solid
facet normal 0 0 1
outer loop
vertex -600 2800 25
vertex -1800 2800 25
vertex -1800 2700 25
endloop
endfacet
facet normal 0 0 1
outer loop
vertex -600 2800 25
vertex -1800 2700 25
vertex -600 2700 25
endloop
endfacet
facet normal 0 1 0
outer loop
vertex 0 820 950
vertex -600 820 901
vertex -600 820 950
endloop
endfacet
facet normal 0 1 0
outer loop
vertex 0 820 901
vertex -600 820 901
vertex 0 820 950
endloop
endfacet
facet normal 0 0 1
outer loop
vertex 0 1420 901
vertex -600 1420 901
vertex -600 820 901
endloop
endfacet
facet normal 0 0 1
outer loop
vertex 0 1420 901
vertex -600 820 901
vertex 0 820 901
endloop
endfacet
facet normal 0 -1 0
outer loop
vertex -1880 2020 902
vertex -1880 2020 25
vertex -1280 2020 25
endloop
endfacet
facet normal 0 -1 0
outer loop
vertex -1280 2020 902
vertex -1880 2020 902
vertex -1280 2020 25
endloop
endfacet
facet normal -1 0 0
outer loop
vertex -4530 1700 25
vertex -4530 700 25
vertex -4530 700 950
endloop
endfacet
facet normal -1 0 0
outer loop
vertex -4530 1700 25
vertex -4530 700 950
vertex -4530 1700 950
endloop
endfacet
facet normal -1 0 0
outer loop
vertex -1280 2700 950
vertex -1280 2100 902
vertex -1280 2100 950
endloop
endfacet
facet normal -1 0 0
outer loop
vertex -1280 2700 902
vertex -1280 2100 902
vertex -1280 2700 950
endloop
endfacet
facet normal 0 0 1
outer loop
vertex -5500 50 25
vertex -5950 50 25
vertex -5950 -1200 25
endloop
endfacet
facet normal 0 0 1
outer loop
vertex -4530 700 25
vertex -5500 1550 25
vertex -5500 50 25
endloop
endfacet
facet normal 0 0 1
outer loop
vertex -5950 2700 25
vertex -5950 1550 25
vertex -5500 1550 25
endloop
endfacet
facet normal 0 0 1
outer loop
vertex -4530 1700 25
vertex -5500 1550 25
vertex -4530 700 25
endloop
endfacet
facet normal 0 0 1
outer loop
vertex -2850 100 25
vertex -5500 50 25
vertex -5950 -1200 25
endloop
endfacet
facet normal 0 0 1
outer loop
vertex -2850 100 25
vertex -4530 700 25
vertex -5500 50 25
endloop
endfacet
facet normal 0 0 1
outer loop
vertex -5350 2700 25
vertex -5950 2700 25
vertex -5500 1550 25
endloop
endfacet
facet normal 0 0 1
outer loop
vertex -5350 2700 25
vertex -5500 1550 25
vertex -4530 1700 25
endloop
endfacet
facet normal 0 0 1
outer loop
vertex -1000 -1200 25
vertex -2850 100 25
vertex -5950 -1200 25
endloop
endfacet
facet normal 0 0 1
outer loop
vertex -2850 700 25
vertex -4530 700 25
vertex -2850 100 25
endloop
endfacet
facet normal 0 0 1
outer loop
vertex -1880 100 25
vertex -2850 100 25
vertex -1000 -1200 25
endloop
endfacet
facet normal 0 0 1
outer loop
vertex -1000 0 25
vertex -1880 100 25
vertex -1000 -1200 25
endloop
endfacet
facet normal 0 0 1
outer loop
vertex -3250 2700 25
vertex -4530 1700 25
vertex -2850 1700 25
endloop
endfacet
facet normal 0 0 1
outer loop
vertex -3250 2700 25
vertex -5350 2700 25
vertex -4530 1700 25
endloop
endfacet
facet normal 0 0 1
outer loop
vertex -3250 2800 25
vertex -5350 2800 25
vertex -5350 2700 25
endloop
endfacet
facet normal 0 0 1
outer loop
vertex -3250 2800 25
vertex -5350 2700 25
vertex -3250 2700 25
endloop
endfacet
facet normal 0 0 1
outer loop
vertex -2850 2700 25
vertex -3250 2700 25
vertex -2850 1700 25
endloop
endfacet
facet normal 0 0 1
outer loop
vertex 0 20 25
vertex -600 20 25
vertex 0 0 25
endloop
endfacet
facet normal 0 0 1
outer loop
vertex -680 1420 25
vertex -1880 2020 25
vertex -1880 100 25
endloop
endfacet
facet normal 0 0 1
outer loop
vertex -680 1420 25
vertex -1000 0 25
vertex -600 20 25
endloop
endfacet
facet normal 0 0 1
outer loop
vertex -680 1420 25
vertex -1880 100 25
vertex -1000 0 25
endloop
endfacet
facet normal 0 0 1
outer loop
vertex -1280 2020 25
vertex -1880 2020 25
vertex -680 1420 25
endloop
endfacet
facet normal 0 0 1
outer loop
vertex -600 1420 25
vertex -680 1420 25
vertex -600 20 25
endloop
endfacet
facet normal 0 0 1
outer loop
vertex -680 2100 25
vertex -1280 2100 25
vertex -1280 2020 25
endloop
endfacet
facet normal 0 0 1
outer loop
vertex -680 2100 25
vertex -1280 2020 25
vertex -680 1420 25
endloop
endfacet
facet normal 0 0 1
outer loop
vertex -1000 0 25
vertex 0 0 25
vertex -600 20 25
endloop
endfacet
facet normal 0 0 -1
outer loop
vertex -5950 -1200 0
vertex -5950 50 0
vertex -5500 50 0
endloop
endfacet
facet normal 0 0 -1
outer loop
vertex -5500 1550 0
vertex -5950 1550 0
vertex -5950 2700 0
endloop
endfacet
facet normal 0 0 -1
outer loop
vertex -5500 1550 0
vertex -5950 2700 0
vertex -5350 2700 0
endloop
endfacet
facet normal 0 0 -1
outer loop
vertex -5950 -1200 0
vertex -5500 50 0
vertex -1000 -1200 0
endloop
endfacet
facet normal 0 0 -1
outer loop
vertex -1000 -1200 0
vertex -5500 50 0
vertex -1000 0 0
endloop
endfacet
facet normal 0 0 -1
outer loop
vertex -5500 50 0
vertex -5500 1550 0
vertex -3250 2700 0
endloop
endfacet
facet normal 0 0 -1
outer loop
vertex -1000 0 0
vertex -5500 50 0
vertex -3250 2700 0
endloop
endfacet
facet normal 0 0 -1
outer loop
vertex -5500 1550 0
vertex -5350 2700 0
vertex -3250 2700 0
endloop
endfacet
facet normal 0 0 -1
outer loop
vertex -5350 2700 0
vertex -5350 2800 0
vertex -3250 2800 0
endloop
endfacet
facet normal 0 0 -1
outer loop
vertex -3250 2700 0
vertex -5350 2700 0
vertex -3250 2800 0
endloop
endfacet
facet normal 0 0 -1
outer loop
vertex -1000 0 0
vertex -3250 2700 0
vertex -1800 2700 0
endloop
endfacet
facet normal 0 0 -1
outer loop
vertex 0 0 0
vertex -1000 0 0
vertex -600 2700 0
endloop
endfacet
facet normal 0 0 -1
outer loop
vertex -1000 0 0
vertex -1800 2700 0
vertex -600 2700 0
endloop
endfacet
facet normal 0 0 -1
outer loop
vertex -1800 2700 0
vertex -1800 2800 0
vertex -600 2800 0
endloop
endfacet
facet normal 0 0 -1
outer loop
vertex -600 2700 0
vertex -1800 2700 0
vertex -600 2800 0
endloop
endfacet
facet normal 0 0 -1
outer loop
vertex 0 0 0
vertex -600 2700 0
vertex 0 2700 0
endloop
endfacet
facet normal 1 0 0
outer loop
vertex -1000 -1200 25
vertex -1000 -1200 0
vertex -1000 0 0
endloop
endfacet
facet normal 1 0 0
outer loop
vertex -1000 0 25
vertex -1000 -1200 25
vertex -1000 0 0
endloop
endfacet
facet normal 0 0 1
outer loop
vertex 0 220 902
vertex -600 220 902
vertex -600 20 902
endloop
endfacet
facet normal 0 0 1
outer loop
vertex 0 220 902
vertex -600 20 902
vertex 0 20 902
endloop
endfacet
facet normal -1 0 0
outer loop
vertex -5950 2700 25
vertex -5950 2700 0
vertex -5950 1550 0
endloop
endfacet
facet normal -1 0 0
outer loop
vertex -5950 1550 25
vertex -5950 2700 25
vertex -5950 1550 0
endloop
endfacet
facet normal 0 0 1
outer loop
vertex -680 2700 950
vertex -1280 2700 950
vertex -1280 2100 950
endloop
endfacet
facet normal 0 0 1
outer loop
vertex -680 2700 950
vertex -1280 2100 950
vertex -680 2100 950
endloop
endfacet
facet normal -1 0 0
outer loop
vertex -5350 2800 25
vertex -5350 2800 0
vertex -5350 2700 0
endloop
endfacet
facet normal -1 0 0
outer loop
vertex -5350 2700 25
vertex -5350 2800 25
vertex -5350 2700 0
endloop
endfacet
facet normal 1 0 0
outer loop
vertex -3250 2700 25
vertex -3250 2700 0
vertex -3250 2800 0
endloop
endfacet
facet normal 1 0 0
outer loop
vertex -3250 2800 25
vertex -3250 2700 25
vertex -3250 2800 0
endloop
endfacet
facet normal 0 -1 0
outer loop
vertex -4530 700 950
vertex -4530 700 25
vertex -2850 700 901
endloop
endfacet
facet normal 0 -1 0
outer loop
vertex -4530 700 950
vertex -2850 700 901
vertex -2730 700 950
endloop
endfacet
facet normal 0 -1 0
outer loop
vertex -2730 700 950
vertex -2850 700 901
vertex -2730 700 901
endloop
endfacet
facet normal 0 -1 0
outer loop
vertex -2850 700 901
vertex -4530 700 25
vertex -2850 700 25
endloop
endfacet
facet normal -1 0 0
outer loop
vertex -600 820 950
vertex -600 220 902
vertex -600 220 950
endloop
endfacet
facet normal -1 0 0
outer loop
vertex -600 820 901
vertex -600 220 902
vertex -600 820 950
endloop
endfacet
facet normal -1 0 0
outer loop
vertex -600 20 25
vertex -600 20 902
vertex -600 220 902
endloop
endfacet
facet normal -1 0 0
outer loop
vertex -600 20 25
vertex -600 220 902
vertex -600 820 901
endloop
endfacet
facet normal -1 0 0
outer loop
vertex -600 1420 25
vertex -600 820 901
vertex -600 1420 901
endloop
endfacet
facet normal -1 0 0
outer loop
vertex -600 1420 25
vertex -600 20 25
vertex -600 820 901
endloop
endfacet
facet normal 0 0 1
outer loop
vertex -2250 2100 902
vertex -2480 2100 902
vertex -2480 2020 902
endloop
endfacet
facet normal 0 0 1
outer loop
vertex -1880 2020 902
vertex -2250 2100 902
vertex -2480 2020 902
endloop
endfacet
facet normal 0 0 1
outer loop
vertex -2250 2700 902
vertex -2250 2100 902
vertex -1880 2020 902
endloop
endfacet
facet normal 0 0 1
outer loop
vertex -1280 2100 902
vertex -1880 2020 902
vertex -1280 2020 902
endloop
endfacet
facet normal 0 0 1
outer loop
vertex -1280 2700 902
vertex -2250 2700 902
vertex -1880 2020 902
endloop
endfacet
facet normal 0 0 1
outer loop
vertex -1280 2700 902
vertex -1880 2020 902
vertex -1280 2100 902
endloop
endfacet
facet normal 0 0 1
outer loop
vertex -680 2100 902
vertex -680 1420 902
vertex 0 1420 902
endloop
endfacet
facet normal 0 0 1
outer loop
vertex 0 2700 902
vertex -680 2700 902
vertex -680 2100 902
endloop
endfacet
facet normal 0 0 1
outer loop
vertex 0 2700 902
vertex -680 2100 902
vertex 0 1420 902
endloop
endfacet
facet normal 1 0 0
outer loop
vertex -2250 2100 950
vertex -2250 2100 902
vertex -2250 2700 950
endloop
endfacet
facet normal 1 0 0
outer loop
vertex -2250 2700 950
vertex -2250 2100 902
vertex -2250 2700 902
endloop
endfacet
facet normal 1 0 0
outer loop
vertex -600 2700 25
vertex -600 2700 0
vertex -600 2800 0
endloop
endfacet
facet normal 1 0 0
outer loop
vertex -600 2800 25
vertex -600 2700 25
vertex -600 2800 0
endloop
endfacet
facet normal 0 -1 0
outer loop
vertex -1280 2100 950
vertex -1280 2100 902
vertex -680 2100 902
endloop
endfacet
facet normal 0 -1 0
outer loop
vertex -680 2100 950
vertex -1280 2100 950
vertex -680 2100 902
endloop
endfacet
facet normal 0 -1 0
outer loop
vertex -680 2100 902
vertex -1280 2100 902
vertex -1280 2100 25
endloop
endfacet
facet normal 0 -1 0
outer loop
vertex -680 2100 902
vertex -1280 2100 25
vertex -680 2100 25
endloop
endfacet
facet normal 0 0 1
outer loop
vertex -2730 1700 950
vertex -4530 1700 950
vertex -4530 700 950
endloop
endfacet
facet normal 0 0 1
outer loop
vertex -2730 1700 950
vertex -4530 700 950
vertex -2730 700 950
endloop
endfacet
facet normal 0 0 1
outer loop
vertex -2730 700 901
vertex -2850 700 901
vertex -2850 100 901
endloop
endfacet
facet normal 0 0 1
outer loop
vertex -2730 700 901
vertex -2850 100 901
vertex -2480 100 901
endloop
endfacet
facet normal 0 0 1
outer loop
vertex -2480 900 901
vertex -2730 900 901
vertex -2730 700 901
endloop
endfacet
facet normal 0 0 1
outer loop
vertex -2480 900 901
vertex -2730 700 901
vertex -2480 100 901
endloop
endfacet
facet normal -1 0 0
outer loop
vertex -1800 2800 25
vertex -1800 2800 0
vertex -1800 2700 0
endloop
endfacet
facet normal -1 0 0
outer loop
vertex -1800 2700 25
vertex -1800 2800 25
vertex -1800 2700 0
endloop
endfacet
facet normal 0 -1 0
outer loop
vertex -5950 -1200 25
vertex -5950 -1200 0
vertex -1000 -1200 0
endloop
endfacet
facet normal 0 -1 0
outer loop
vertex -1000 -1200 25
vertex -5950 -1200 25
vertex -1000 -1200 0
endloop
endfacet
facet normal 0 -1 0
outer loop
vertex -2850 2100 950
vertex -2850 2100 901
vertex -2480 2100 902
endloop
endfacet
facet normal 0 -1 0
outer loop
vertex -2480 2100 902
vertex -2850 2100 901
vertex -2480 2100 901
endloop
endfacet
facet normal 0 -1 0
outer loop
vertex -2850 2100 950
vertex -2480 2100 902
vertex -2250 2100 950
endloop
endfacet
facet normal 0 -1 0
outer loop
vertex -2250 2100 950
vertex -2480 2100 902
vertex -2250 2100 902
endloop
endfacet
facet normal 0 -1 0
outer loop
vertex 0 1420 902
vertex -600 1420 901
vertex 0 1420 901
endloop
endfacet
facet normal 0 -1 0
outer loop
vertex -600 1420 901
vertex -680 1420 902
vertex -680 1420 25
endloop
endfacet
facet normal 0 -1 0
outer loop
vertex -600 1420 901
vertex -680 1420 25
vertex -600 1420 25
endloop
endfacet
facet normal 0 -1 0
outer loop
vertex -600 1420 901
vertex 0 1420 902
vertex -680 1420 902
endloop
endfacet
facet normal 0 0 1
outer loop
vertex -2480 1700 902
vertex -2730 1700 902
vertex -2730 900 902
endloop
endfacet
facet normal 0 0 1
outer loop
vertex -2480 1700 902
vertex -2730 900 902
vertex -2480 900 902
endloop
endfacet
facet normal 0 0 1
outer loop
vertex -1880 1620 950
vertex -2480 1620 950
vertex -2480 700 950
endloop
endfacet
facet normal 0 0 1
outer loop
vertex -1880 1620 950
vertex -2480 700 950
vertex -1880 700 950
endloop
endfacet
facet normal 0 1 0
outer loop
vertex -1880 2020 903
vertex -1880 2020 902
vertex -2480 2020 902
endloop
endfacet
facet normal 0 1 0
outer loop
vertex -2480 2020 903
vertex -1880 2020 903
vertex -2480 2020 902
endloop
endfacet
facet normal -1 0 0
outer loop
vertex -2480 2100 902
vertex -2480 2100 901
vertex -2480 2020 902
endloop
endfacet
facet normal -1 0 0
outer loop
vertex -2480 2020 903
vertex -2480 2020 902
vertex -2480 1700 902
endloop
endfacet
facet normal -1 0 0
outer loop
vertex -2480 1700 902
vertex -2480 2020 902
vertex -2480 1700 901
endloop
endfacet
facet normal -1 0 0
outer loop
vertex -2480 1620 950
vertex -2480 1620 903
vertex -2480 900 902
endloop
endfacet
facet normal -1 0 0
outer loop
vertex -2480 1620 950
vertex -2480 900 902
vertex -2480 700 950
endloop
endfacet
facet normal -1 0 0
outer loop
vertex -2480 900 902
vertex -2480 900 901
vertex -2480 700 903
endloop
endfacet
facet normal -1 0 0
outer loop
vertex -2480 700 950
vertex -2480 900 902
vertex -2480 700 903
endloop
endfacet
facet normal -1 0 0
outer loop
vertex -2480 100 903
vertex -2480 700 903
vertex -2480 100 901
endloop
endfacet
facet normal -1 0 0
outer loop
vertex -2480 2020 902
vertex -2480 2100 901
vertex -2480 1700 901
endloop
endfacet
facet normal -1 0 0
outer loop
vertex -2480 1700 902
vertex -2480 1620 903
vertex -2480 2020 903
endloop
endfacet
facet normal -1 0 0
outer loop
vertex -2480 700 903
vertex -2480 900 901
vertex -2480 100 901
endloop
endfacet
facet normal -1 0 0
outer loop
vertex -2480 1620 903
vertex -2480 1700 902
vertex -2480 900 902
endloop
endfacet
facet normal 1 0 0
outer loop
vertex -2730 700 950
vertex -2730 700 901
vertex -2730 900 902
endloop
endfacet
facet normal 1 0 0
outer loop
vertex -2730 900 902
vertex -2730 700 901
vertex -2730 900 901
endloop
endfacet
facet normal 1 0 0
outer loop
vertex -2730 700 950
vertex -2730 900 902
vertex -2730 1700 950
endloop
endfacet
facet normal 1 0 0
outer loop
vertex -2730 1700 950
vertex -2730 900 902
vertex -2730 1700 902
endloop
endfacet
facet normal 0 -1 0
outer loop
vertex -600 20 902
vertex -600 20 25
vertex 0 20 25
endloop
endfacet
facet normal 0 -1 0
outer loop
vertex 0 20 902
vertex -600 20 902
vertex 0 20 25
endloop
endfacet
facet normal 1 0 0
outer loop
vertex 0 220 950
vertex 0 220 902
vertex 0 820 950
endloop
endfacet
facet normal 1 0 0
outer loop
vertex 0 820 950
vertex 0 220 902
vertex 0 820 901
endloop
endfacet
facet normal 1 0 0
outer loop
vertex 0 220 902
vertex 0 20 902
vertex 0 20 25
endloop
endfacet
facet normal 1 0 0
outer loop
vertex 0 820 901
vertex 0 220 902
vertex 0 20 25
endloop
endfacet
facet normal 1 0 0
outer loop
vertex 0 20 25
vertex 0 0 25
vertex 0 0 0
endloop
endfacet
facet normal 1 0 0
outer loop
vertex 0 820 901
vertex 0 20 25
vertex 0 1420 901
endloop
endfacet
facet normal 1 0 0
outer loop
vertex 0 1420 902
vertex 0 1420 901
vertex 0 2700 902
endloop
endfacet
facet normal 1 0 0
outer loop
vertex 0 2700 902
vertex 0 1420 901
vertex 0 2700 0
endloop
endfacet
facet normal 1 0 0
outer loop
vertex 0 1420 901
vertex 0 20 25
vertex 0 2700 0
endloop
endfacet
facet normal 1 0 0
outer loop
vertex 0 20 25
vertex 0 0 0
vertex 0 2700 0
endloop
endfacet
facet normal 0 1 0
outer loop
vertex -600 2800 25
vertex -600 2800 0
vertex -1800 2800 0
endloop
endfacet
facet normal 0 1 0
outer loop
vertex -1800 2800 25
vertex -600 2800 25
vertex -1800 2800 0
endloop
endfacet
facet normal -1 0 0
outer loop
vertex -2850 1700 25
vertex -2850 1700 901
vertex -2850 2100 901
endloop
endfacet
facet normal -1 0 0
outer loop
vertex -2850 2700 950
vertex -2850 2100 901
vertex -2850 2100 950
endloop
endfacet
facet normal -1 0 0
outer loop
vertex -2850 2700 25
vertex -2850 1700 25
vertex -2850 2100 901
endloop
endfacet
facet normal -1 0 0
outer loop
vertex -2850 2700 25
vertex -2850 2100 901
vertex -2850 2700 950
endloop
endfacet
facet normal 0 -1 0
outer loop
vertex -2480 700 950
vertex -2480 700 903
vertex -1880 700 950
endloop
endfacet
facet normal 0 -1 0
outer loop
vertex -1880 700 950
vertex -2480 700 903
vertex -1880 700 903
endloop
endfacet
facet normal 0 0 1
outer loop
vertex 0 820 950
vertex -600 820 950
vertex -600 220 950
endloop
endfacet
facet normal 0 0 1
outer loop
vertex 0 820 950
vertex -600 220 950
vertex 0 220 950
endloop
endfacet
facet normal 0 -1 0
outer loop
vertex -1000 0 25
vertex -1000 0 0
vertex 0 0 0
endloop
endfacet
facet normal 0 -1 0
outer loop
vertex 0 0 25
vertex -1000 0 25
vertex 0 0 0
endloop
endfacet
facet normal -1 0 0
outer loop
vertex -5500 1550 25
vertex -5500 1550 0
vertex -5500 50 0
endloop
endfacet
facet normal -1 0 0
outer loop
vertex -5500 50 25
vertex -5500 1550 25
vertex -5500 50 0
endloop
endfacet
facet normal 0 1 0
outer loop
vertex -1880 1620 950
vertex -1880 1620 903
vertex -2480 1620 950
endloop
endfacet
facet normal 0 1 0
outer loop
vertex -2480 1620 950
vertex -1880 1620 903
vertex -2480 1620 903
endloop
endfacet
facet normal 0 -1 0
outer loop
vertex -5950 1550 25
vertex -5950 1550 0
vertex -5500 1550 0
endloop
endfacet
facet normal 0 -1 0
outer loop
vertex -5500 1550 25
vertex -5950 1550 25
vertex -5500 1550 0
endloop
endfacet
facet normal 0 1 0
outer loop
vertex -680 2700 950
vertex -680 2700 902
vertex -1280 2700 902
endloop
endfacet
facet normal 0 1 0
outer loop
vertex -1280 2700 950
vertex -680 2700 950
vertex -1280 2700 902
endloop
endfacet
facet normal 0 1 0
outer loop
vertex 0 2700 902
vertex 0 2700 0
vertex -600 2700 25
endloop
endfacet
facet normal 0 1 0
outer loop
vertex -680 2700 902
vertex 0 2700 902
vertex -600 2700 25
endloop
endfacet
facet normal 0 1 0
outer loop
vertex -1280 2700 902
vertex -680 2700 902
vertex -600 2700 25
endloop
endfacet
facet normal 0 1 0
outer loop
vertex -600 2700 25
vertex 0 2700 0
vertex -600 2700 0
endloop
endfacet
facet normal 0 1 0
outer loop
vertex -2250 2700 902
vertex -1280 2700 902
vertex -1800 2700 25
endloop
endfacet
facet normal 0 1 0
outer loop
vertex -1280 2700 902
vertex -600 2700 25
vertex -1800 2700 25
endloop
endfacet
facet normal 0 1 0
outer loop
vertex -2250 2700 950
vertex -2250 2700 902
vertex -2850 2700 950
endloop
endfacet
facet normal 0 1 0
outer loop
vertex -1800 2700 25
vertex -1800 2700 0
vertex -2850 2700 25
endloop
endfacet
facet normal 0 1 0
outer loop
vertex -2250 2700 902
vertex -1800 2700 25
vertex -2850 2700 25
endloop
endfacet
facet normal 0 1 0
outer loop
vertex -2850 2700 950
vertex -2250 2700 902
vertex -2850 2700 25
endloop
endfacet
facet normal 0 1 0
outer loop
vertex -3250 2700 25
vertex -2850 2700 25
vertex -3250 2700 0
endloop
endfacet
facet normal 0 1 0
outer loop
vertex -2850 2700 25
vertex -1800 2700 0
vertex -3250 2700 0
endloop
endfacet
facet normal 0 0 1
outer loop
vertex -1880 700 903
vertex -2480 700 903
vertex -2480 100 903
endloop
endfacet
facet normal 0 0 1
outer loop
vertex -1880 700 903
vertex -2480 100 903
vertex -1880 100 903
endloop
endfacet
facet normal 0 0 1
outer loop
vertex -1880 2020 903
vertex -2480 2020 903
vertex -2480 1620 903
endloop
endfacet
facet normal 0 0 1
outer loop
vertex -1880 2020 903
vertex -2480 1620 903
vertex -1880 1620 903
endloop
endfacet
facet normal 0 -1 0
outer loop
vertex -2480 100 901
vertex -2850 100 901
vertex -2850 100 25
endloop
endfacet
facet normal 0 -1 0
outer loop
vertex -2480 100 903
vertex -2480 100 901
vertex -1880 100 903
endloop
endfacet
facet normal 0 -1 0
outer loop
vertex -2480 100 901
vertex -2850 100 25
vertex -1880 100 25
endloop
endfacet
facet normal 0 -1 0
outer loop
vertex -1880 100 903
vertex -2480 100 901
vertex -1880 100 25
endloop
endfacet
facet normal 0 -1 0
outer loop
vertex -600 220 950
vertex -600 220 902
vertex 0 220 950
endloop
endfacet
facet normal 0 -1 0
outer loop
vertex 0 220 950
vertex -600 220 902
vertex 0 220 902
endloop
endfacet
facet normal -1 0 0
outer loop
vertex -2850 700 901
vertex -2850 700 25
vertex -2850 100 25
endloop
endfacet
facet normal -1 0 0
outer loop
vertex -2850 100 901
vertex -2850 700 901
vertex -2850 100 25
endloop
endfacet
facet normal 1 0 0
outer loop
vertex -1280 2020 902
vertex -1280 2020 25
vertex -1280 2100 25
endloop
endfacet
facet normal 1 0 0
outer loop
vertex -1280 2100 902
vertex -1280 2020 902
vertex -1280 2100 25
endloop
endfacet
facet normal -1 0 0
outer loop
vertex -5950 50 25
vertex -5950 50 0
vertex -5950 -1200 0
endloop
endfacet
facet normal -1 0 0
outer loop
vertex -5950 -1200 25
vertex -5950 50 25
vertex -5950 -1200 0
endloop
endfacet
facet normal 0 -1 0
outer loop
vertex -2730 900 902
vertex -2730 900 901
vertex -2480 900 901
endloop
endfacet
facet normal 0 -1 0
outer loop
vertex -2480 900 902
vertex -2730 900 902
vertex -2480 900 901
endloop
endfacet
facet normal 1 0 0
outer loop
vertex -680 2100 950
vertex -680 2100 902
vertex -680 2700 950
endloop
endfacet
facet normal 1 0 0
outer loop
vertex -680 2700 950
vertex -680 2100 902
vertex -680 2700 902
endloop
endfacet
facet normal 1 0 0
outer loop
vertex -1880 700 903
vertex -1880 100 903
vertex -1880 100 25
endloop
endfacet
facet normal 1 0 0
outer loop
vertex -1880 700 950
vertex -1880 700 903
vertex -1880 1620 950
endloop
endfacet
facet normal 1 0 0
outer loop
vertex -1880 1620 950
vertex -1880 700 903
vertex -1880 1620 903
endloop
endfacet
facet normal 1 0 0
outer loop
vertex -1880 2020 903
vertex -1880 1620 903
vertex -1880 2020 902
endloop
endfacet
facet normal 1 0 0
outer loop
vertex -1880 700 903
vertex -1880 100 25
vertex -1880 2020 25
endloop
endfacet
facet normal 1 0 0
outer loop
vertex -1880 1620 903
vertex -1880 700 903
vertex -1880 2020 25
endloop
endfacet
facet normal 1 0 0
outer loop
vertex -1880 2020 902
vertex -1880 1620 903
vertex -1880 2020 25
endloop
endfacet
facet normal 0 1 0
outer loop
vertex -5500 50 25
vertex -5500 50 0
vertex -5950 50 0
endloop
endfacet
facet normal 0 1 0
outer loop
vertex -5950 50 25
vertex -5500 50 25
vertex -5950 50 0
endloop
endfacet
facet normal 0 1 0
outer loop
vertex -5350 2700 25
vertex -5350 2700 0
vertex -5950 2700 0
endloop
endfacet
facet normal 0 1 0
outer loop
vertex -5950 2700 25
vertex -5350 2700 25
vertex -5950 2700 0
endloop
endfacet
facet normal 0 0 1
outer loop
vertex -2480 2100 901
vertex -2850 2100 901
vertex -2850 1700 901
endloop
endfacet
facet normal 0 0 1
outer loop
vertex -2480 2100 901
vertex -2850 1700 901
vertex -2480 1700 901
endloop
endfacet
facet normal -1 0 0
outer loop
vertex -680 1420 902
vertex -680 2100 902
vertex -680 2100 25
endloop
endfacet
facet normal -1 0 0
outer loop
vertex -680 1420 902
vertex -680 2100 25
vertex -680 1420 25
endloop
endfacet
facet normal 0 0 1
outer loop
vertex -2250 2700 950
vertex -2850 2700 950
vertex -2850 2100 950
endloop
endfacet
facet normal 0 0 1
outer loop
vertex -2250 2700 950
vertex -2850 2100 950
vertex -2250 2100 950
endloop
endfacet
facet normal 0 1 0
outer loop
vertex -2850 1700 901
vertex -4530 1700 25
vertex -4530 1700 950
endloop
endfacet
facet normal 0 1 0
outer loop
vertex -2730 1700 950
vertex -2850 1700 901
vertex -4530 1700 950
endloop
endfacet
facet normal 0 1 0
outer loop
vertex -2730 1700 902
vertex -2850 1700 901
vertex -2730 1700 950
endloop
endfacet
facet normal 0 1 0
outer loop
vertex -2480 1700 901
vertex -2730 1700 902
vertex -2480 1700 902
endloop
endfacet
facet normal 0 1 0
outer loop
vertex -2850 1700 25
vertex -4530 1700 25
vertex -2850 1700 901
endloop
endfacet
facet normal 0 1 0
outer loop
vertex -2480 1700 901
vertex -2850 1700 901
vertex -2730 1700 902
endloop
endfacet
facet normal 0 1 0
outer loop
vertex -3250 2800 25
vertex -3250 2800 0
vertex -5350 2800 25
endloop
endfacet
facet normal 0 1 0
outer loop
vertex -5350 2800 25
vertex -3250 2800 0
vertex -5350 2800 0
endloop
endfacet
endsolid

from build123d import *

# Parameters (mm, degrees)
F1_DEPTH = 25
F2_W     = 600
F2_H     = 600
F3_DEPTH = 903
F2_H_2   = 200
F4_DEPTH = 902
F2_W_2   = 80
F2_H_3   = 80
F5_DEPTH = 901
F2_W_3   = 290
F6_W     = 1800
F6_H     = 1000
F7_DEPTH = 950


with BuildPart() as f1:
    # F0 (on Top) → F1 (new body)
    with BuildSketch(Plane.XY):
        Polygon((-1000, 0), (0, 0), (0, 2700), (-600, 2700), (-600, 2800), (-1800, 2800), (-1800, 2700), (-3250, 2700), (-3250, 2800), (-5350, 2800), (-5350, 2700), (-5950, 2700), (-5950, 1550), (-5500, 1550), (-5500, 50), (-5950, 50), (-5950, -1200), (-1000, -1200), align=None)
    extrude(amount=F1_DEPTH)

    # F2 (on Top) → F3 (join)
    with BuildSketch(Plane.XY):
        Polygon((-1880, 1620), (-1880, 2020), (-2480, 2020), (-2480, 1700), (-2480, 1620), align=None)
        with Locations((-2180, 400)):
            Rectangle(F2_W, F2_H)
    extrude(amount=F3_DEPTH)

    # F2 (on Top) → F4 (join)
    with BuildSketch(Plane.XY):
        Polygon((-2480, 1620), (-2480, 1700), (-2850, 1700), (-2850, 900), (-2480, 900), align=None)
        Polygon((0, 1420), (0, 2700), (-680, 2700), (-680, 2100), (-680, 1420), (-600, 1420), align=None)
        Polygon((-1280, 2100), (-1280, 2700), (-2250, 2700), (-2250, 2100), (-2480, 2100), (-2480, 2020), (-1880, 2020), (-1280, 2020), align=None)
        with Locations((-300, 120)):
            Rectangle(F2_W, F2_H_2)
    extrude(amount=F4_DEPTH)

    # F2 (on Top) → F5 (join)
    with BuildSketch(Plane.XY):
        Polygon((-2560, 2020), (-2560, 2100), (-2850, 2100), (-2850, 1700), (-2480, 1700), (-2480, 2020), align=None)
        with Locations((-2520, 2060)):
            Rectangle(F2_W_2, F2_H_3)
        Polygon((-2480, 700), (-2480, 900), (-2850, 900), (-2850, 100), (-2480, 100), align=None)
        with Locations((-300, 1120)):
            Rectangle(F2_W, F2_H)
    extrude(amount=F5_DEPTH)

    # F2 (on Top) + F6 (on Top) → F7 (join)
    with BuildSketch(Plane.XY):
        with Locations((-980, 2400)):
            Rectangle(F2_W, F2_H)
        with Locations((-300, 520)):
            Rectangle(F2_W, F2_H)
        Polygon((-1880, 700), (-1880, 1620), (-2480, 1620), (-2480, 900), (-2480, 700), align=None)
        with Locations((-2705, 2400)):
            Rectangle(F2_W_3, F2_H)
        Polygon((-2250, 2100), (-2250, 2700), (-2560, 2700), (-2560, 2100), (-2480, 2100), align=None)
    with BuildSketch(Plane.XY):
        with Locations((-3630, 1200)):
            Rectangle(F6_W, F6_H)
    extrude(amount=F7_DEPTH)


solid = f1.part
